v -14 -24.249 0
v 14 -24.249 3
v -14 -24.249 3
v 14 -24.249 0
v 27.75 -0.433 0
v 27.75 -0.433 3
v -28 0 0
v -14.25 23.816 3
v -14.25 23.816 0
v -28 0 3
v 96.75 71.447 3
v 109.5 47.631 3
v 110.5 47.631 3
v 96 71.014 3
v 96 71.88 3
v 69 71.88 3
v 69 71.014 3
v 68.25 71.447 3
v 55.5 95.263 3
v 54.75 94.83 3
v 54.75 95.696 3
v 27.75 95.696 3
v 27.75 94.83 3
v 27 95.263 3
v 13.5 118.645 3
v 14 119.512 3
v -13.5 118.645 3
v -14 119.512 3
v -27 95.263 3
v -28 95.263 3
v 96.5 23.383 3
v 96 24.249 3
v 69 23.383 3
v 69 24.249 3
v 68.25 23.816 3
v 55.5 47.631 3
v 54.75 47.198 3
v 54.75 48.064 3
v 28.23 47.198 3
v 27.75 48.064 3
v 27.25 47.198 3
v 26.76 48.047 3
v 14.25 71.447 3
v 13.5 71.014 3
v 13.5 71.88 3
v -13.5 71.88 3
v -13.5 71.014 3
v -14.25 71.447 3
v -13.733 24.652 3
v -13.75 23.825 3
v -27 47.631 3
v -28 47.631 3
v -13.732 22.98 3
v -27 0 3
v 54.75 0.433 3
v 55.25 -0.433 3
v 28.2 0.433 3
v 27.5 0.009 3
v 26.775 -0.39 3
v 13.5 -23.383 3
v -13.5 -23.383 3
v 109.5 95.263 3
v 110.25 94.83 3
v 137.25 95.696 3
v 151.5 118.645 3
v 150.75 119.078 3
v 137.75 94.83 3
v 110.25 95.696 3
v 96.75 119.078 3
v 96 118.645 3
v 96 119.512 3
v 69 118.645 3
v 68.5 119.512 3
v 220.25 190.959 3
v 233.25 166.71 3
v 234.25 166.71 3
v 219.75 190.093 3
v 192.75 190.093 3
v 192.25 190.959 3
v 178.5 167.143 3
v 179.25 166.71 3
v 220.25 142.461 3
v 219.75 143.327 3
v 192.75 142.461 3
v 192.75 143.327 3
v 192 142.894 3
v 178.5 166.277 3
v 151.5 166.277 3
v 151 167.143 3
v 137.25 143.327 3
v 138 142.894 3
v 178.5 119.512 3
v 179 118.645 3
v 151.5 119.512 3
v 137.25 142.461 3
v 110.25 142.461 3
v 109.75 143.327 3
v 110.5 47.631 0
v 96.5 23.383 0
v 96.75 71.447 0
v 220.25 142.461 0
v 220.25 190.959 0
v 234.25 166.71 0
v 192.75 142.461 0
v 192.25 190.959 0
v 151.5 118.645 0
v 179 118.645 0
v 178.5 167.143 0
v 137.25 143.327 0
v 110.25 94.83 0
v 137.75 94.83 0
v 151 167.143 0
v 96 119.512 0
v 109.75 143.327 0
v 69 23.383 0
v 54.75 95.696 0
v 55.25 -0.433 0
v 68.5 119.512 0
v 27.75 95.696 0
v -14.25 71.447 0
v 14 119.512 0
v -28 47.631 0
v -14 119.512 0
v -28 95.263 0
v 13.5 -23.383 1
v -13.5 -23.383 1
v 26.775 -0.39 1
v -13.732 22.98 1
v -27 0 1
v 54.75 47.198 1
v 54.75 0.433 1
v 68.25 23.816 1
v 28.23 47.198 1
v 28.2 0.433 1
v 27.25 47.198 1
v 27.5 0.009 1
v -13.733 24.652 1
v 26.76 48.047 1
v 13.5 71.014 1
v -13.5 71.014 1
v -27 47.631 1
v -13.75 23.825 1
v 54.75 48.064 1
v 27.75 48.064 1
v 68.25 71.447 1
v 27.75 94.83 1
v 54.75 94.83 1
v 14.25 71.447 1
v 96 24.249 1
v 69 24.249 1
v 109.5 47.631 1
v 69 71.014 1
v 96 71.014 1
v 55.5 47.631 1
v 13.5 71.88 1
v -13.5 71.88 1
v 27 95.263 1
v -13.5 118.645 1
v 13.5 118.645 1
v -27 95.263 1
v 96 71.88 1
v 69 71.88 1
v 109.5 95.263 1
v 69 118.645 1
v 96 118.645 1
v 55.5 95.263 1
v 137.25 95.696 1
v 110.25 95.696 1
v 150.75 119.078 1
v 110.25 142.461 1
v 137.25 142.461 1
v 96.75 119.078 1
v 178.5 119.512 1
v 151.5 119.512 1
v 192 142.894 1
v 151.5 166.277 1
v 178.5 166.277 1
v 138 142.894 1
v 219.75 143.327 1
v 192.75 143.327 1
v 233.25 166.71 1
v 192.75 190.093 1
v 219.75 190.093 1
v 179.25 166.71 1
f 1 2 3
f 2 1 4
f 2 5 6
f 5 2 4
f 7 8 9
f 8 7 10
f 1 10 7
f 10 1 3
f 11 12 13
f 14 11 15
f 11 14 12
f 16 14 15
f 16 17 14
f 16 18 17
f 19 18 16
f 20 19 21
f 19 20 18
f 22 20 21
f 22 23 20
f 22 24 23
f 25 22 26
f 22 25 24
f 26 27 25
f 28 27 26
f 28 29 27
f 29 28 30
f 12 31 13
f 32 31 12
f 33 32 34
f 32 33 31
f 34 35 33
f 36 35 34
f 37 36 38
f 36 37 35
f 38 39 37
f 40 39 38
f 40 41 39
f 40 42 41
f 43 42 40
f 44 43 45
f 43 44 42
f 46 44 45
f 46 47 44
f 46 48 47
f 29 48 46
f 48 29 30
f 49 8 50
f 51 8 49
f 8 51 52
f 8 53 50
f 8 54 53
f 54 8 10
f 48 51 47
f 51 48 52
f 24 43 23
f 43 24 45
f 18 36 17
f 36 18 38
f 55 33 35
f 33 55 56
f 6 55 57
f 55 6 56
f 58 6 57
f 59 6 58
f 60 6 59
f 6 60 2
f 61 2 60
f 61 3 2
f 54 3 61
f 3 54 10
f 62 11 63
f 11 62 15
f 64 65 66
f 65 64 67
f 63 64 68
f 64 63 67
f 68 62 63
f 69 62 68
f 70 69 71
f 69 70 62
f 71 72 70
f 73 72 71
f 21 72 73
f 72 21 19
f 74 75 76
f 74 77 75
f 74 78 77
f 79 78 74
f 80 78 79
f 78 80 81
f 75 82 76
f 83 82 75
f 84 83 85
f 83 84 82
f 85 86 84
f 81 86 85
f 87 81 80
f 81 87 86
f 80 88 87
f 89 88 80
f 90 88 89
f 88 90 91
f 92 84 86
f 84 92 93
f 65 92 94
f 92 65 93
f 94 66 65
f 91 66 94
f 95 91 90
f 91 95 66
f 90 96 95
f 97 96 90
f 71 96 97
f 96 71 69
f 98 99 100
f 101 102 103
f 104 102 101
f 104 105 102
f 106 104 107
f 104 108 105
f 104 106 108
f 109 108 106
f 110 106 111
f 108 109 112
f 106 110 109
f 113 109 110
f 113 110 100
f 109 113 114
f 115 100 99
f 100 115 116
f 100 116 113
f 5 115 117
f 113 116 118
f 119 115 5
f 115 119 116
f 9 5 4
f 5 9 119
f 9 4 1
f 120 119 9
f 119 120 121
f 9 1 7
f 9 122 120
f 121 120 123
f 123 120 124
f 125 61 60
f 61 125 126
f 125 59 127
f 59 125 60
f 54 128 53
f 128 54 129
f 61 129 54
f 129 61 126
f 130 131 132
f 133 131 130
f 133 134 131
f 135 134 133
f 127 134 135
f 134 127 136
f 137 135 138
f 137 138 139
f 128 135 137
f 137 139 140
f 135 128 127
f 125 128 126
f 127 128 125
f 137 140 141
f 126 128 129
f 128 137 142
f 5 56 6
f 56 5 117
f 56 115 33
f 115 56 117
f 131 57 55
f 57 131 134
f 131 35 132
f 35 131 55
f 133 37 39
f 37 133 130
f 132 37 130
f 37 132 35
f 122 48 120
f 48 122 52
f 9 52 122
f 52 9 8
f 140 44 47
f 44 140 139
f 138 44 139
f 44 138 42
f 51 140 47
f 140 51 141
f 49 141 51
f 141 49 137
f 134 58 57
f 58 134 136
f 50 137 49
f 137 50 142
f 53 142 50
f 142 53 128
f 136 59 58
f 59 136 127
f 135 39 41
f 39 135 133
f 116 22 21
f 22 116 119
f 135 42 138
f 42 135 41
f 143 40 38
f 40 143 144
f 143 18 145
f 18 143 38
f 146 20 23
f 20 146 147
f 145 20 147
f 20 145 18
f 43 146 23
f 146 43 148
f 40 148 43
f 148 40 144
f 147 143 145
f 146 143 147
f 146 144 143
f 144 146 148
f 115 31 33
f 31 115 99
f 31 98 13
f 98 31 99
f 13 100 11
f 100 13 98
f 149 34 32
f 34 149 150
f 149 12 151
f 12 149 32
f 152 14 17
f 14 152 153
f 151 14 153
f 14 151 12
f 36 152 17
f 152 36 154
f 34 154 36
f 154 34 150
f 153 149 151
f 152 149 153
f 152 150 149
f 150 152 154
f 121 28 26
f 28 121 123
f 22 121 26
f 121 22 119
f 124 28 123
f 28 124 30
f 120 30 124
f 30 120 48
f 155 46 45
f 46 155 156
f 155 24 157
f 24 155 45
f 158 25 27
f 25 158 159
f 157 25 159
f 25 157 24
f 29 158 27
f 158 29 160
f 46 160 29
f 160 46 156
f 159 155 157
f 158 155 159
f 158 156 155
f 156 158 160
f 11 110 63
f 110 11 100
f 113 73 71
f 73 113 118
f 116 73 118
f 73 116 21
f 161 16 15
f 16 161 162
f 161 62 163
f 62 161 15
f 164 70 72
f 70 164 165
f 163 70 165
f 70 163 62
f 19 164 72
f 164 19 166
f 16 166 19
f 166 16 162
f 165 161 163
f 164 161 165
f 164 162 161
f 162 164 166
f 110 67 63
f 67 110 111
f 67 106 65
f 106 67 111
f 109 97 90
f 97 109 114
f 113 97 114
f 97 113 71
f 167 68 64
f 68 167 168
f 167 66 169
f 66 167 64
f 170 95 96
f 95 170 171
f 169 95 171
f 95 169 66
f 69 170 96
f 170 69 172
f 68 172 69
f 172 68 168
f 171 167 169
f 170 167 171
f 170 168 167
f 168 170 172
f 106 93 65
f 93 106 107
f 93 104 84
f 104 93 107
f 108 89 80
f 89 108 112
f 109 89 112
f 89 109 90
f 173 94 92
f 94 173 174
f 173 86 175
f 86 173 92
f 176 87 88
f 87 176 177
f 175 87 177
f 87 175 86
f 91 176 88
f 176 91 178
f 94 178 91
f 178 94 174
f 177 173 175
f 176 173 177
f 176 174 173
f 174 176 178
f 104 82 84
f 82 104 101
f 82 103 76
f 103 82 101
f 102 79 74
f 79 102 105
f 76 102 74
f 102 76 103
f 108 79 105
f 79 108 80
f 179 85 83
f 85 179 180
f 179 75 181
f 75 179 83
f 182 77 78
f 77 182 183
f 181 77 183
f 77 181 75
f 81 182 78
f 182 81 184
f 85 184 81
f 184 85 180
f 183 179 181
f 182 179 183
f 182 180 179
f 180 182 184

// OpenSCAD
$fn = 150;

union() {
	difference() {
		union() {
			translate(v = [0.0, 0.0, 0]) {
				difference() {
					cylinder($fn = 6, d = 56.0, h = 3.0);
					translate(v = [0, 0, 1.0]) {
						cylinder($fn = 6, d = 54.0, h = 3.0);
					}
				}
			}
			translate(v = [41.25, 23.81569860407206, 0]) {
				difference() {
					cylinder($fn = 6, d = 56.0, h = 3.0);
					translate(v = [0, 0, 1.0]) {
						cylinder($fn = 6, d = 54.0, h = 3.0);
					}
				}
			}
			translate(v = [0.0, 47.63139720814412, 0]) {
				difference() {
					cylinder($fn = 6, d = 56.0, h = 3.0);
					translate(v = [0, 0, 1.0]) {
						cylinder($fn = 6, d = 54.0, h = 3.0);
					}
				}
			}
		}
		translate(v = [13.75, 23.824673200287624, 1.0]) {
			cylinder(d = 55.0, h = 3.5);
		}
	}
	translate(v = [41.25, 71.44709581221619, 0]) {
		difference() {
			cylinder($fn = 6, d = 56.0, h = 3.0);
			translate(v = [0, 0, 1.0]) {
				cylinder($fn = 6, d = 54.0, h = 3.0);
			}
		}
	}
	translate(v = [82.5, 47.63139720814412, 0]) {
		difference() {
			cylinder($fn = 6, d = 56.0, h = 3.0);
			translate(v = [0, 0, 1.0]) {
				cylinder($fn = 6, d = 54.0, h = 3.0);
			}
		}
	}
	translate(v = [0.0, 95.26279441628824, 0]) {
		difference() {
			cylinder($fn = 6, d = 56.0, h = 3.0);
			translate(v = [0, 0, 1.0]) {
				cylinder($fn = 6, d = 54.0, h = 3.0);
			}
		}
	}
	translate(v = [82.5, 95.26279441628824, 0]) {
		difference() {
			cylinder($fn = 6, d = 56.0, h = 3.0);
			translate(v = [0, 0, 1.0]) {
				cylinder($fn = 6, d = 54.0, h = 3.0);
			}
		}
	}
	translate(v = [123.75, 119.0784930203603, 0]) {
		difference() {
			cylinder($fn = 6, d = 56.0, h = 3.0);
			translate(v = [0, 0, 1.0]) {
				cylinder($fn = 6, d = 54.0, h = 3.0);
			}
		}
	}
	translate(v = [165.0, 142.89419162443238, 0]) {
		difference() {
			cylinder($fn = 6, d = 56.0, h = 3.0);
			translate(v = [0, 0, 1.0]) {
				cylinder($fn = 6, d = 54.0, h = 3.0);
			}
		}
	}
	translate(v = [206.25, 166.70989022850443, 0]) {
		difference() {
			cylinder($fn = 6, d = 56.0, h = 3.0);
			translate(v = [0, 0, 1.0]) {
				cylinder($fn = 6, d = 54.0, h = 3.0);
			}
		}
	}
}
